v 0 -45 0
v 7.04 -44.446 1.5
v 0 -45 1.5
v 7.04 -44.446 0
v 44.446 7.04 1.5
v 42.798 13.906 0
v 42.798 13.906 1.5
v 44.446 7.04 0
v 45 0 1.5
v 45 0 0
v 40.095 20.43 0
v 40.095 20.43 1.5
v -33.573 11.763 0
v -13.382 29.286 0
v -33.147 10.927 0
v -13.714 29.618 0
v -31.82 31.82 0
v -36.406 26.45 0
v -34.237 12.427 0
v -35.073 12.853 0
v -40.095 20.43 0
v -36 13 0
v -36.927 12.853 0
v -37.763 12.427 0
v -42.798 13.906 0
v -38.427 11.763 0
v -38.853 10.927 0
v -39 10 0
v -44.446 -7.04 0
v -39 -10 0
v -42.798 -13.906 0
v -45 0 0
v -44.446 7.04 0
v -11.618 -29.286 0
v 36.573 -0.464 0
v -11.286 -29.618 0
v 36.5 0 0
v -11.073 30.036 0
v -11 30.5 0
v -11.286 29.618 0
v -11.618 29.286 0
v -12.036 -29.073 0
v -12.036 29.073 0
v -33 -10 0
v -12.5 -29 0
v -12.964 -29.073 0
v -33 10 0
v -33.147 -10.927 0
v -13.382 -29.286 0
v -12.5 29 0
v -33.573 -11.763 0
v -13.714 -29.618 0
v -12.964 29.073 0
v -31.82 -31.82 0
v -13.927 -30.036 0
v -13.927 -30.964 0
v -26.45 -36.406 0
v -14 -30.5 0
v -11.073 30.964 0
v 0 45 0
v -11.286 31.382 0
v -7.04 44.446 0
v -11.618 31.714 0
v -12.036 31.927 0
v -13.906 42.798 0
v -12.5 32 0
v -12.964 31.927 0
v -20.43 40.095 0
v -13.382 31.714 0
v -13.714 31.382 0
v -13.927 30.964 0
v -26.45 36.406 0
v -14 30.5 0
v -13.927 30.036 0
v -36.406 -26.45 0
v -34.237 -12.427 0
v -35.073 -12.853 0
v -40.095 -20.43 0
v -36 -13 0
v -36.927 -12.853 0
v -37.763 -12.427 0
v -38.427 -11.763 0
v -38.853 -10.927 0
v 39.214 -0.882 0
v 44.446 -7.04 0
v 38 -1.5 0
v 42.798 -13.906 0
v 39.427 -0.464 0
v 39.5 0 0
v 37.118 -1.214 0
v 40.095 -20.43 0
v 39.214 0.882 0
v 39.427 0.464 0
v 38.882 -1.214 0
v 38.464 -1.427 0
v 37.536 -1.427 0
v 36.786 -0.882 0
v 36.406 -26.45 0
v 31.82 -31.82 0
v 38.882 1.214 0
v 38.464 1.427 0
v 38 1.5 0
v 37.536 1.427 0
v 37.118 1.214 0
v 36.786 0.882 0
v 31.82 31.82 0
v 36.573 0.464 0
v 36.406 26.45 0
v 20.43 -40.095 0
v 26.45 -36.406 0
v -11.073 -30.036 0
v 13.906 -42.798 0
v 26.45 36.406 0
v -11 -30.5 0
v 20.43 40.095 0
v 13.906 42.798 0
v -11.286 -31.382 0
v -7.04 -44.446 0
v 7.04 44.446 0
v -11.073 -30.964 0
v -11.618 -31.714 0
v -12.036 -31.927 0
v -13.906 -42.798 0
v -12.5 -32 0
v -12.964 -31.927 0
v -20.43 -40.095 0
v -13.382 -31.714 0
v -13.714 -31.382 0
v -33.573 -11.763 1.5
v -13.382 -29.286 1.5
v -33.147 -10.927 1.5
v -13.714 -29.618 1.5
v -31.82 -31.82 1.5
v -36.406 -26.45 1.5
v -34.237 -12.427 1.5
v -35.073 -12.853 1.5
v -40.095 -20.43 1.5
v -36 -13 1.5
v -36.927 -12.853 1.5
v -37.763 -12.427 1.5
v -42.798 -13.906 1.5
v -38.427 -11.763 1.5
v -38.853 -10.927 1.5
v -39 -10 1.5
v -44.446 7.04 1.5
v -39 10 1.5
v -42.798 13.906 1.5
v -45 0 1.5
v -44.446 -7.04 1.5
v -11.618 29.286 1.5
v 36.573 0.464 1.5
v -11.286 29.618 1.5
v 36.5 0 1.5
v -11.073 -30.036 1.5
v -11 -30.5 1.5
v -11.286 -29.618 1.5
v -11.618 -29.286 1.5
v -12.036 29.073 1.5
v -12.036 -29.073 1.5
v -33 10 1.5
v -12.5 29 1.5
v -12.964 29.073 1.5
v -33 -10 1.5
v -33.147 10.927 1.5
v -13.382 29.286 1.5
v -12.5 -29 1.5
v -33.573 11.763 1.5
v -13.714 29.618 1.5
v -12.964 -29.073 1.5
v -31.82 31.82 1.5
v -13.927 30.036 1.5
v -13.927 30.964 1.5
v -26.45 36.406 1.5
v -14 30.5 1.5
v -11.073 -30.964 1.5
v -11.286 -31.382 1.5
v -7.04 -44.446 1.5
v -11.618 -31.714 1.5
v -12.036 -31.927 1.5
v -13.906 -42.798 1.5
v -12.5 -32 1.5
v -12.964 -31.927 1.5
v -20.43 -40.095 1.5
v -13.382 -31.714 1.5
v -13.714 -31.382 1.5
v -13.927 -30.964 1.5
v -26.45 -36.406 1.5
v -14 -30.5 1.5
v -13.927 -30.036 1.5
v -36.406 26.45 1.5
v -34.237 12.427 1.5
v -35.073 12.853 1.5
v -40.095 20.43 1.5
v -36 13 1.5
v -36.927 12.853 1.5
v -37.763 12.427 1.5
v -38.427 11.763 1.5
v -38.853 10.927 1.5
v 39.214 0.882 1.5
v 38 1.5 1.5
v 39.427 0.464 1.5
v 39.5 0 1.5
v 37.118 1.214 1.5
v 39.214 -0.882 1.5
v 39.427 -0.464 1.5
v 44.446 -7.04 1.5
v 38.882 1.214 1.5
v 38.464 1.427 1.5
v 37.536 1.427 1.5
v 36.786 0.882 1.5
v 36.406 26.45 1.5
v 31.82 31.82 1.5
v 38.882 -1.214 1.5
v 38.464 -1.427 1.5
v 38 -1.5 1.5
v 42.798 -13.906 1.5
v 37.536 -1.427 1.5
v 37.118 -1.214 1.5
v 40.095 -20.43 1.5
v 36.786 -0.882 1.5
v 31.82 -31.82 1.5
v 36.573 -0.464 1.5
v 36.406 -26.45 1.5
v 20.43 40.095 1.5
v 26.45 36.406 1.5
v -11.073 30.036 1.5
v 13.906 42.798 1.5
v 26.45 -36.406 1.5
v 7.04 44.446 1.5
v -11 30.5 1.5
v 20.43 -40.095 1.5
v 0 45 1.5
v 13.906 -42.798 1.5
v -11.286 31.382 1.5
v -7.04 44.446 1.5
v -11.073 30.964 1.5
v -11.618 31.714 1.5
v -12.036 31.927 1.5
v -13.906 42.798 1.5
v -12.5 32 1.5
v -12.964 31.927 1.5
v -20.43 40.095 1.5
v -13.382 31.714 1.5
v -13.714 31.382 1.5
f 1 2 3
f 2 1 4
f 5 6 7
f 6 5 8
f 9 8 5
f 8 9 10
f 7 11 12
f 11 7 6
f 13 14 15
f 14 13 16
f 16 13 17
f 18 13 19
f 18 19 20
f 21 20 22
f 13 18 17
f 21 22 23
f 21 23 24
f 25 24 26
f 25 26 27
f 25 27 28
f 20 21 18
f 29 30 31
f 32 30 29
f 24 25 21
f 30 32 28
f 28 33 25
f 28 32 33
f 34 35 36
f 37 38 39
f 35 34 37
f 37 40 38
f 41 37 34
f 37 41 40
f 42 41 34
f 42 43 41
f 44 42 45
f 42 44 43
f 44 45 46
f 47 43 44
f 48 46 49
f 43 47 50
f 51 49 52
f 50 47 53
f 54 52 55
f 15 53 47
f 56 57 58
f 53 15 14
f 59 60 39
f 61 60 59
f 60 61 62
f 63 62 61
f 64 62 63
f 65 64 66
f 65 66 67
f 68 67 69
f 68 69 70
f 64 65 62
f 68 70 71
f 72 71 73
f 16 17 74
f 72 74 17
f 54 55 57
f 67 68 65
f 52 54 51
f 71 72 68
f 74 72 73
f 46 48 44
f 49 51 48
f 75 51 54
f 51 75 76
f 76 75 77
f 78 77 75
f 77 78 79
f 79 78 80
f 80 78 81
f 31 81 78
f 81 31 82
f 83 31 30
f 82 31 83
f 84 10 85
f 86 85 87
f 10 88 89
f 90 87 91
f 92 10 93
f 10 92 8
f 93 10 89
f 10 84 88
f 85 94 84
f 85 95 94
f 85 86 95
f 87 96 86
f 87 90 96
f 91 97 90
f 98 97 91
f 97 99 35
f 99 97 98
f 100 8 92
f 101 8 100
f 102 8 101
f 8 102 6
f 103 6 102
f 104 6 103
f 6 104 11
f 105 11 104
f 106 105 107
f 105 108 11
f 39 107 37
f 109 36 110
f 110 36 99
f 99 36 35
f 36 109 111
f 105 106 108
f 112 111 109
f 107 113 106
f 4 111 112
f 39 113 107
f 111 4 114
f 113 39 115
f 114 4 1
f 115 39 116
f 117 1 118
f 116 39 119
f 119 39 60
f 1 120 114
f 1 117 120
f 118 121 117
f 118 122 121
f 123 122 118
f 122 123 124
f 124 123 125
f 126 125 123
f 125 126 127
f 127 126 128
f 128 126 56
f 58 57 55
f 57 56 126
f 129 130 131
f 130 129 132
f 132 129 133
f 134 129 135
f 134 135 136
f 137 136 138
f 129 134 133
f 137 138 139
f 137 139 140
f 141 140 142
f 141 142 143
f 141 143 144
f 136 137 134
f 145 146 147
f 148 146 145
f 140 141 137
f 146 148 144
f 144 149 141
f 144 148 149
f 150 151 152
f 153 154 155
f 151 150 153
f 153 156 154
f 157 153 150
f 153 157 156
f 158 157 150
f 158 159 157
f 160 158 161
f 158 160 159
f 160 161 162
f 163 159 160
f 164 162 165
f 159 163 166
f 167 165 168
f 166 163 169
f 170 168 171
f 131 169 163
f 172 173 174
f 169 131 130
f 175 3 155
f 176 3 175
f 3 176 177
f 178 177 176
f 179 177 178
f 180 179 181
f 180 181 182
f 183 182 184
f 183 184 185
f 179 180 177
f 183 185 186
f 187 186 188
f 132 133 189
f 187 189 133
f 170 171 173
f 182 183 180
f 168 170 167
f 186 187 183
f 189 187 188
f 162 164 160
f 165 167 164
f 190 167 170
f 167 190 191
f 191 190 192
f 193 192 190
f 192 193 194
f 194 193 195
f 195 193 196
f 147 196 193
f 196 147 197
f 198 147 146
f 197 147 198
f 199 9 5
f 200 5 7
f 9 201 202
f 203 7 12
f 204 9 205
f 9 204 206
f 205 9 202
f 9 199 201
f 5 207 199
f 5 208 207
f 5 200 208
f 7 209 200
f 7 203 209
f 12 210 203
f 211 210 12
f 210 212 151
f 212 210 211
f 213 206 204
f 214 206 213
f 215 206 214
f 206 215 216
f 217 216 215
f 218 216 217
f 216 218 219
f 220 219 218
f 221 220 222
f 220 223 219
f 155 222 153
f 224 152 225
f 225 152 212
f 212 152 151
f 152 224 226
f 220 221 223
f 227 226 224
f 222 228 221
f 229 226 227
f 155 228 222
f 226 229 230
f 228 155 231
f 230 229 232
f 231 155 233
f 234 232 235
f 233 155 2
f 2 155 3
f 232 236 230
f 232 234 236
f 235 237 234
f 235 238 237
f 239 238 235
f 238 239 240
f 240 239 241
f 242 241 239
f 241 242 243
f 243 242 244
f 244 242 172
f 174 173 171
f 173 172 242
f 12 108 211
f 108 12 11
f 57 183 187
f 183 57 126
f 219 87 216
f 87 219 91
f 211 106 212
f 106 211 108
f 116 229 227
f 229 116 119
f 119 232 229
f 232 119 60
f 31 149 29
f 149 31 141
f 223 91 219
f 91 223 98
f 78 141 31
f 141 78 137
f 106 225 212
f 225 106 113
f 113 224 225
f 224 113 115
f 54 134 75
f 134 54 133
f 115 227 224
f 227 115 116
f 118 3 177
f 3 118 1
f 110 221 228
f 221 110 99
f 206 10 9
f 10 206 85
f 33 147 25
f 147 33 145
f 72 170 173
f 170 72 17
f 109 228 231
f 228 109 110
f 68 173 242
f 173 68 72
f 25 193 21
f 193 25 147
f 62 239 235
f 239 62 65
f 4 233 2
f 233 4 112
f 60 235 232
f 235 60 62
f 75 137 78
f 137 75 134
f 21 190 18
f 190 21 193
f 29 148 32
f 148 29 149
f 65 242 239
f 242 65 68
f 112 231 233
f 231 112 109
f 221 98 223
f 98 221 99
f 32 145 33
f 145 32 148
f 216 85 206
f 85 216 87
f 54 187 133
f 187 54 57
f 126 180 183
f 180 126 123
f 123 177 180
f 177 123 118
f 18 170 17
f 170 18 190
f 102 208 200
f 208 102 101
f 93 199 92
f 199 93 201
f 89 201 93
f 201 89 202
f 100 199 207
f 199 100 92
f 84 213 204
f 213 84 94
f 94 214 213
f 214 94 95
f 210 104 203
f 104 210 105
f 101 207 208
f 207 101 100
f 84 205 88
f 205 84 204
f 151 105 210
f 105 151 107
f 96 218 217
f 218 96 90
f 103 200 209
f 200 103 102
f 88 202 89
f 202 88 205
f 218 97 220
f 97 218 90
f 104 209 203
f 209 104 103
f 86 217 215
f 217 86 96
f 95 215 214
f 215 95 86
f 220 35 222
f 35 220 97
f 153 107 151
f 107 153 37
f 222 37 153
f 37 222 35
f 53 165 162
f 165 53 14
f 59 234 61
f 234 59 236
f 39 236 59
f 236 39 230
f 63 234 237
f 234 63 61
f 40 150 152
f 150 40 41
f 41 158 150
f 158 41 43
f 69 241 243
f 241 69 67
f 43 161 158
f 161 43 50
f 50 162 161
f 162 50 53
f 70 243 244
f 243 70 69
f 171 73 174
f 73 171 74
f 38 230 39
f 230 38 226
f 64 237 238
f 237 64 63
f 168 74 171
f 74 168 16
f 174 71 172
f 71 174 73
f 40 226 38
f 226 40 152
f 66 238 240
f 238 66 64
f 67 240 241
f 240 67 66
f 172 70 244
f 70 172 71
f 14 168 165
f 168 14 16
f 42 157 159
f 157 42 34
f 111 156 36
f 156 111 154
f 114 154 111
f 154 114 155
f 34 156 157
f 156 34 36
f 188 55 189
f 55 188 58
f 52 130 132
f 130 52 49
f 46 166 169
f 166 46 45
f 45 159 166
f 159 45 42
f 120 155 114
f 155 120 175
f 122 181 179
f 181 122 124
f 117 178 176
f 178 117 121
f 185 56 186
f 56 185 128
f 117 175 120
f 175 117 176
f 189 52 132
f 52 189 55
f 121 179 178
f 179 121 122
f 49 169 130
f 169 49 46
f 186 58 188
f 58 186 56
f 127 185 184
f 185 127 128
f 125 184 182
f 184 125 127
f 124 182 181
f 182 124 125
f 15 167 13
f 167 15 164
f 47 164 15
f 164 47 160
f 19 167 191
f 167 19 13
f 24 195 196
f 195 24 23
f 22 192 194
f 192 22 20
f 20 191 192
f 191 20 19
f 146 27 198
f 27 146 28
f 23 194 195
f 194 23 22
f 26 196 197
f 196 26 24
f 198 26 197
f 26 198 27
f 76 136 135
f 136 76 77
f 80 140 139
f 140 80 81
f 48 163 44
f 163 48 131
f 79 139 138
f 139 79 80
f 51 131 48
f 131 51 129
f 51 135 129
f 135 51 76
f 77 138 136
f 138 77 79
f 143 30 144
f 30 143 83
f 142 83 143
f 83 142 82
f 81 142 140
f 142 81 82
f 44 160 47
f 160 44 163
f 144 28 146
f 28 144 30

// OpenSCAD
// base superior del robot educativo Sapoconcho

difference()
{
    cylinder(h=1.5,r1=45,r2=45,$fn=40);
    
    translate([38,0,-0.5])
        cylinder(h=2.5,r1=1.5,r2=1.5,$fn=20);
    translate([-12.5,30.5,-0.5])
        cylinder(h=2.5,r1=1.5,r2=1.5,$fn=20);
    translate([-12.5,-30.5,-0.5])
        cylinder(h=2.5,r1=1.5,r2=1.5,$fn=20);
    translate([-36,10,-0.5])
        cylinder(h=2.5,r1=3,r2=3,$fn=20);
    translate([-36,-10,-0.5])
        cylinder(h=2.5,r1=3,r2=3,$fn=20);
    translate([-36,0,0.5])
        cube(size=[6,20,2.5],center=true);
    
}
